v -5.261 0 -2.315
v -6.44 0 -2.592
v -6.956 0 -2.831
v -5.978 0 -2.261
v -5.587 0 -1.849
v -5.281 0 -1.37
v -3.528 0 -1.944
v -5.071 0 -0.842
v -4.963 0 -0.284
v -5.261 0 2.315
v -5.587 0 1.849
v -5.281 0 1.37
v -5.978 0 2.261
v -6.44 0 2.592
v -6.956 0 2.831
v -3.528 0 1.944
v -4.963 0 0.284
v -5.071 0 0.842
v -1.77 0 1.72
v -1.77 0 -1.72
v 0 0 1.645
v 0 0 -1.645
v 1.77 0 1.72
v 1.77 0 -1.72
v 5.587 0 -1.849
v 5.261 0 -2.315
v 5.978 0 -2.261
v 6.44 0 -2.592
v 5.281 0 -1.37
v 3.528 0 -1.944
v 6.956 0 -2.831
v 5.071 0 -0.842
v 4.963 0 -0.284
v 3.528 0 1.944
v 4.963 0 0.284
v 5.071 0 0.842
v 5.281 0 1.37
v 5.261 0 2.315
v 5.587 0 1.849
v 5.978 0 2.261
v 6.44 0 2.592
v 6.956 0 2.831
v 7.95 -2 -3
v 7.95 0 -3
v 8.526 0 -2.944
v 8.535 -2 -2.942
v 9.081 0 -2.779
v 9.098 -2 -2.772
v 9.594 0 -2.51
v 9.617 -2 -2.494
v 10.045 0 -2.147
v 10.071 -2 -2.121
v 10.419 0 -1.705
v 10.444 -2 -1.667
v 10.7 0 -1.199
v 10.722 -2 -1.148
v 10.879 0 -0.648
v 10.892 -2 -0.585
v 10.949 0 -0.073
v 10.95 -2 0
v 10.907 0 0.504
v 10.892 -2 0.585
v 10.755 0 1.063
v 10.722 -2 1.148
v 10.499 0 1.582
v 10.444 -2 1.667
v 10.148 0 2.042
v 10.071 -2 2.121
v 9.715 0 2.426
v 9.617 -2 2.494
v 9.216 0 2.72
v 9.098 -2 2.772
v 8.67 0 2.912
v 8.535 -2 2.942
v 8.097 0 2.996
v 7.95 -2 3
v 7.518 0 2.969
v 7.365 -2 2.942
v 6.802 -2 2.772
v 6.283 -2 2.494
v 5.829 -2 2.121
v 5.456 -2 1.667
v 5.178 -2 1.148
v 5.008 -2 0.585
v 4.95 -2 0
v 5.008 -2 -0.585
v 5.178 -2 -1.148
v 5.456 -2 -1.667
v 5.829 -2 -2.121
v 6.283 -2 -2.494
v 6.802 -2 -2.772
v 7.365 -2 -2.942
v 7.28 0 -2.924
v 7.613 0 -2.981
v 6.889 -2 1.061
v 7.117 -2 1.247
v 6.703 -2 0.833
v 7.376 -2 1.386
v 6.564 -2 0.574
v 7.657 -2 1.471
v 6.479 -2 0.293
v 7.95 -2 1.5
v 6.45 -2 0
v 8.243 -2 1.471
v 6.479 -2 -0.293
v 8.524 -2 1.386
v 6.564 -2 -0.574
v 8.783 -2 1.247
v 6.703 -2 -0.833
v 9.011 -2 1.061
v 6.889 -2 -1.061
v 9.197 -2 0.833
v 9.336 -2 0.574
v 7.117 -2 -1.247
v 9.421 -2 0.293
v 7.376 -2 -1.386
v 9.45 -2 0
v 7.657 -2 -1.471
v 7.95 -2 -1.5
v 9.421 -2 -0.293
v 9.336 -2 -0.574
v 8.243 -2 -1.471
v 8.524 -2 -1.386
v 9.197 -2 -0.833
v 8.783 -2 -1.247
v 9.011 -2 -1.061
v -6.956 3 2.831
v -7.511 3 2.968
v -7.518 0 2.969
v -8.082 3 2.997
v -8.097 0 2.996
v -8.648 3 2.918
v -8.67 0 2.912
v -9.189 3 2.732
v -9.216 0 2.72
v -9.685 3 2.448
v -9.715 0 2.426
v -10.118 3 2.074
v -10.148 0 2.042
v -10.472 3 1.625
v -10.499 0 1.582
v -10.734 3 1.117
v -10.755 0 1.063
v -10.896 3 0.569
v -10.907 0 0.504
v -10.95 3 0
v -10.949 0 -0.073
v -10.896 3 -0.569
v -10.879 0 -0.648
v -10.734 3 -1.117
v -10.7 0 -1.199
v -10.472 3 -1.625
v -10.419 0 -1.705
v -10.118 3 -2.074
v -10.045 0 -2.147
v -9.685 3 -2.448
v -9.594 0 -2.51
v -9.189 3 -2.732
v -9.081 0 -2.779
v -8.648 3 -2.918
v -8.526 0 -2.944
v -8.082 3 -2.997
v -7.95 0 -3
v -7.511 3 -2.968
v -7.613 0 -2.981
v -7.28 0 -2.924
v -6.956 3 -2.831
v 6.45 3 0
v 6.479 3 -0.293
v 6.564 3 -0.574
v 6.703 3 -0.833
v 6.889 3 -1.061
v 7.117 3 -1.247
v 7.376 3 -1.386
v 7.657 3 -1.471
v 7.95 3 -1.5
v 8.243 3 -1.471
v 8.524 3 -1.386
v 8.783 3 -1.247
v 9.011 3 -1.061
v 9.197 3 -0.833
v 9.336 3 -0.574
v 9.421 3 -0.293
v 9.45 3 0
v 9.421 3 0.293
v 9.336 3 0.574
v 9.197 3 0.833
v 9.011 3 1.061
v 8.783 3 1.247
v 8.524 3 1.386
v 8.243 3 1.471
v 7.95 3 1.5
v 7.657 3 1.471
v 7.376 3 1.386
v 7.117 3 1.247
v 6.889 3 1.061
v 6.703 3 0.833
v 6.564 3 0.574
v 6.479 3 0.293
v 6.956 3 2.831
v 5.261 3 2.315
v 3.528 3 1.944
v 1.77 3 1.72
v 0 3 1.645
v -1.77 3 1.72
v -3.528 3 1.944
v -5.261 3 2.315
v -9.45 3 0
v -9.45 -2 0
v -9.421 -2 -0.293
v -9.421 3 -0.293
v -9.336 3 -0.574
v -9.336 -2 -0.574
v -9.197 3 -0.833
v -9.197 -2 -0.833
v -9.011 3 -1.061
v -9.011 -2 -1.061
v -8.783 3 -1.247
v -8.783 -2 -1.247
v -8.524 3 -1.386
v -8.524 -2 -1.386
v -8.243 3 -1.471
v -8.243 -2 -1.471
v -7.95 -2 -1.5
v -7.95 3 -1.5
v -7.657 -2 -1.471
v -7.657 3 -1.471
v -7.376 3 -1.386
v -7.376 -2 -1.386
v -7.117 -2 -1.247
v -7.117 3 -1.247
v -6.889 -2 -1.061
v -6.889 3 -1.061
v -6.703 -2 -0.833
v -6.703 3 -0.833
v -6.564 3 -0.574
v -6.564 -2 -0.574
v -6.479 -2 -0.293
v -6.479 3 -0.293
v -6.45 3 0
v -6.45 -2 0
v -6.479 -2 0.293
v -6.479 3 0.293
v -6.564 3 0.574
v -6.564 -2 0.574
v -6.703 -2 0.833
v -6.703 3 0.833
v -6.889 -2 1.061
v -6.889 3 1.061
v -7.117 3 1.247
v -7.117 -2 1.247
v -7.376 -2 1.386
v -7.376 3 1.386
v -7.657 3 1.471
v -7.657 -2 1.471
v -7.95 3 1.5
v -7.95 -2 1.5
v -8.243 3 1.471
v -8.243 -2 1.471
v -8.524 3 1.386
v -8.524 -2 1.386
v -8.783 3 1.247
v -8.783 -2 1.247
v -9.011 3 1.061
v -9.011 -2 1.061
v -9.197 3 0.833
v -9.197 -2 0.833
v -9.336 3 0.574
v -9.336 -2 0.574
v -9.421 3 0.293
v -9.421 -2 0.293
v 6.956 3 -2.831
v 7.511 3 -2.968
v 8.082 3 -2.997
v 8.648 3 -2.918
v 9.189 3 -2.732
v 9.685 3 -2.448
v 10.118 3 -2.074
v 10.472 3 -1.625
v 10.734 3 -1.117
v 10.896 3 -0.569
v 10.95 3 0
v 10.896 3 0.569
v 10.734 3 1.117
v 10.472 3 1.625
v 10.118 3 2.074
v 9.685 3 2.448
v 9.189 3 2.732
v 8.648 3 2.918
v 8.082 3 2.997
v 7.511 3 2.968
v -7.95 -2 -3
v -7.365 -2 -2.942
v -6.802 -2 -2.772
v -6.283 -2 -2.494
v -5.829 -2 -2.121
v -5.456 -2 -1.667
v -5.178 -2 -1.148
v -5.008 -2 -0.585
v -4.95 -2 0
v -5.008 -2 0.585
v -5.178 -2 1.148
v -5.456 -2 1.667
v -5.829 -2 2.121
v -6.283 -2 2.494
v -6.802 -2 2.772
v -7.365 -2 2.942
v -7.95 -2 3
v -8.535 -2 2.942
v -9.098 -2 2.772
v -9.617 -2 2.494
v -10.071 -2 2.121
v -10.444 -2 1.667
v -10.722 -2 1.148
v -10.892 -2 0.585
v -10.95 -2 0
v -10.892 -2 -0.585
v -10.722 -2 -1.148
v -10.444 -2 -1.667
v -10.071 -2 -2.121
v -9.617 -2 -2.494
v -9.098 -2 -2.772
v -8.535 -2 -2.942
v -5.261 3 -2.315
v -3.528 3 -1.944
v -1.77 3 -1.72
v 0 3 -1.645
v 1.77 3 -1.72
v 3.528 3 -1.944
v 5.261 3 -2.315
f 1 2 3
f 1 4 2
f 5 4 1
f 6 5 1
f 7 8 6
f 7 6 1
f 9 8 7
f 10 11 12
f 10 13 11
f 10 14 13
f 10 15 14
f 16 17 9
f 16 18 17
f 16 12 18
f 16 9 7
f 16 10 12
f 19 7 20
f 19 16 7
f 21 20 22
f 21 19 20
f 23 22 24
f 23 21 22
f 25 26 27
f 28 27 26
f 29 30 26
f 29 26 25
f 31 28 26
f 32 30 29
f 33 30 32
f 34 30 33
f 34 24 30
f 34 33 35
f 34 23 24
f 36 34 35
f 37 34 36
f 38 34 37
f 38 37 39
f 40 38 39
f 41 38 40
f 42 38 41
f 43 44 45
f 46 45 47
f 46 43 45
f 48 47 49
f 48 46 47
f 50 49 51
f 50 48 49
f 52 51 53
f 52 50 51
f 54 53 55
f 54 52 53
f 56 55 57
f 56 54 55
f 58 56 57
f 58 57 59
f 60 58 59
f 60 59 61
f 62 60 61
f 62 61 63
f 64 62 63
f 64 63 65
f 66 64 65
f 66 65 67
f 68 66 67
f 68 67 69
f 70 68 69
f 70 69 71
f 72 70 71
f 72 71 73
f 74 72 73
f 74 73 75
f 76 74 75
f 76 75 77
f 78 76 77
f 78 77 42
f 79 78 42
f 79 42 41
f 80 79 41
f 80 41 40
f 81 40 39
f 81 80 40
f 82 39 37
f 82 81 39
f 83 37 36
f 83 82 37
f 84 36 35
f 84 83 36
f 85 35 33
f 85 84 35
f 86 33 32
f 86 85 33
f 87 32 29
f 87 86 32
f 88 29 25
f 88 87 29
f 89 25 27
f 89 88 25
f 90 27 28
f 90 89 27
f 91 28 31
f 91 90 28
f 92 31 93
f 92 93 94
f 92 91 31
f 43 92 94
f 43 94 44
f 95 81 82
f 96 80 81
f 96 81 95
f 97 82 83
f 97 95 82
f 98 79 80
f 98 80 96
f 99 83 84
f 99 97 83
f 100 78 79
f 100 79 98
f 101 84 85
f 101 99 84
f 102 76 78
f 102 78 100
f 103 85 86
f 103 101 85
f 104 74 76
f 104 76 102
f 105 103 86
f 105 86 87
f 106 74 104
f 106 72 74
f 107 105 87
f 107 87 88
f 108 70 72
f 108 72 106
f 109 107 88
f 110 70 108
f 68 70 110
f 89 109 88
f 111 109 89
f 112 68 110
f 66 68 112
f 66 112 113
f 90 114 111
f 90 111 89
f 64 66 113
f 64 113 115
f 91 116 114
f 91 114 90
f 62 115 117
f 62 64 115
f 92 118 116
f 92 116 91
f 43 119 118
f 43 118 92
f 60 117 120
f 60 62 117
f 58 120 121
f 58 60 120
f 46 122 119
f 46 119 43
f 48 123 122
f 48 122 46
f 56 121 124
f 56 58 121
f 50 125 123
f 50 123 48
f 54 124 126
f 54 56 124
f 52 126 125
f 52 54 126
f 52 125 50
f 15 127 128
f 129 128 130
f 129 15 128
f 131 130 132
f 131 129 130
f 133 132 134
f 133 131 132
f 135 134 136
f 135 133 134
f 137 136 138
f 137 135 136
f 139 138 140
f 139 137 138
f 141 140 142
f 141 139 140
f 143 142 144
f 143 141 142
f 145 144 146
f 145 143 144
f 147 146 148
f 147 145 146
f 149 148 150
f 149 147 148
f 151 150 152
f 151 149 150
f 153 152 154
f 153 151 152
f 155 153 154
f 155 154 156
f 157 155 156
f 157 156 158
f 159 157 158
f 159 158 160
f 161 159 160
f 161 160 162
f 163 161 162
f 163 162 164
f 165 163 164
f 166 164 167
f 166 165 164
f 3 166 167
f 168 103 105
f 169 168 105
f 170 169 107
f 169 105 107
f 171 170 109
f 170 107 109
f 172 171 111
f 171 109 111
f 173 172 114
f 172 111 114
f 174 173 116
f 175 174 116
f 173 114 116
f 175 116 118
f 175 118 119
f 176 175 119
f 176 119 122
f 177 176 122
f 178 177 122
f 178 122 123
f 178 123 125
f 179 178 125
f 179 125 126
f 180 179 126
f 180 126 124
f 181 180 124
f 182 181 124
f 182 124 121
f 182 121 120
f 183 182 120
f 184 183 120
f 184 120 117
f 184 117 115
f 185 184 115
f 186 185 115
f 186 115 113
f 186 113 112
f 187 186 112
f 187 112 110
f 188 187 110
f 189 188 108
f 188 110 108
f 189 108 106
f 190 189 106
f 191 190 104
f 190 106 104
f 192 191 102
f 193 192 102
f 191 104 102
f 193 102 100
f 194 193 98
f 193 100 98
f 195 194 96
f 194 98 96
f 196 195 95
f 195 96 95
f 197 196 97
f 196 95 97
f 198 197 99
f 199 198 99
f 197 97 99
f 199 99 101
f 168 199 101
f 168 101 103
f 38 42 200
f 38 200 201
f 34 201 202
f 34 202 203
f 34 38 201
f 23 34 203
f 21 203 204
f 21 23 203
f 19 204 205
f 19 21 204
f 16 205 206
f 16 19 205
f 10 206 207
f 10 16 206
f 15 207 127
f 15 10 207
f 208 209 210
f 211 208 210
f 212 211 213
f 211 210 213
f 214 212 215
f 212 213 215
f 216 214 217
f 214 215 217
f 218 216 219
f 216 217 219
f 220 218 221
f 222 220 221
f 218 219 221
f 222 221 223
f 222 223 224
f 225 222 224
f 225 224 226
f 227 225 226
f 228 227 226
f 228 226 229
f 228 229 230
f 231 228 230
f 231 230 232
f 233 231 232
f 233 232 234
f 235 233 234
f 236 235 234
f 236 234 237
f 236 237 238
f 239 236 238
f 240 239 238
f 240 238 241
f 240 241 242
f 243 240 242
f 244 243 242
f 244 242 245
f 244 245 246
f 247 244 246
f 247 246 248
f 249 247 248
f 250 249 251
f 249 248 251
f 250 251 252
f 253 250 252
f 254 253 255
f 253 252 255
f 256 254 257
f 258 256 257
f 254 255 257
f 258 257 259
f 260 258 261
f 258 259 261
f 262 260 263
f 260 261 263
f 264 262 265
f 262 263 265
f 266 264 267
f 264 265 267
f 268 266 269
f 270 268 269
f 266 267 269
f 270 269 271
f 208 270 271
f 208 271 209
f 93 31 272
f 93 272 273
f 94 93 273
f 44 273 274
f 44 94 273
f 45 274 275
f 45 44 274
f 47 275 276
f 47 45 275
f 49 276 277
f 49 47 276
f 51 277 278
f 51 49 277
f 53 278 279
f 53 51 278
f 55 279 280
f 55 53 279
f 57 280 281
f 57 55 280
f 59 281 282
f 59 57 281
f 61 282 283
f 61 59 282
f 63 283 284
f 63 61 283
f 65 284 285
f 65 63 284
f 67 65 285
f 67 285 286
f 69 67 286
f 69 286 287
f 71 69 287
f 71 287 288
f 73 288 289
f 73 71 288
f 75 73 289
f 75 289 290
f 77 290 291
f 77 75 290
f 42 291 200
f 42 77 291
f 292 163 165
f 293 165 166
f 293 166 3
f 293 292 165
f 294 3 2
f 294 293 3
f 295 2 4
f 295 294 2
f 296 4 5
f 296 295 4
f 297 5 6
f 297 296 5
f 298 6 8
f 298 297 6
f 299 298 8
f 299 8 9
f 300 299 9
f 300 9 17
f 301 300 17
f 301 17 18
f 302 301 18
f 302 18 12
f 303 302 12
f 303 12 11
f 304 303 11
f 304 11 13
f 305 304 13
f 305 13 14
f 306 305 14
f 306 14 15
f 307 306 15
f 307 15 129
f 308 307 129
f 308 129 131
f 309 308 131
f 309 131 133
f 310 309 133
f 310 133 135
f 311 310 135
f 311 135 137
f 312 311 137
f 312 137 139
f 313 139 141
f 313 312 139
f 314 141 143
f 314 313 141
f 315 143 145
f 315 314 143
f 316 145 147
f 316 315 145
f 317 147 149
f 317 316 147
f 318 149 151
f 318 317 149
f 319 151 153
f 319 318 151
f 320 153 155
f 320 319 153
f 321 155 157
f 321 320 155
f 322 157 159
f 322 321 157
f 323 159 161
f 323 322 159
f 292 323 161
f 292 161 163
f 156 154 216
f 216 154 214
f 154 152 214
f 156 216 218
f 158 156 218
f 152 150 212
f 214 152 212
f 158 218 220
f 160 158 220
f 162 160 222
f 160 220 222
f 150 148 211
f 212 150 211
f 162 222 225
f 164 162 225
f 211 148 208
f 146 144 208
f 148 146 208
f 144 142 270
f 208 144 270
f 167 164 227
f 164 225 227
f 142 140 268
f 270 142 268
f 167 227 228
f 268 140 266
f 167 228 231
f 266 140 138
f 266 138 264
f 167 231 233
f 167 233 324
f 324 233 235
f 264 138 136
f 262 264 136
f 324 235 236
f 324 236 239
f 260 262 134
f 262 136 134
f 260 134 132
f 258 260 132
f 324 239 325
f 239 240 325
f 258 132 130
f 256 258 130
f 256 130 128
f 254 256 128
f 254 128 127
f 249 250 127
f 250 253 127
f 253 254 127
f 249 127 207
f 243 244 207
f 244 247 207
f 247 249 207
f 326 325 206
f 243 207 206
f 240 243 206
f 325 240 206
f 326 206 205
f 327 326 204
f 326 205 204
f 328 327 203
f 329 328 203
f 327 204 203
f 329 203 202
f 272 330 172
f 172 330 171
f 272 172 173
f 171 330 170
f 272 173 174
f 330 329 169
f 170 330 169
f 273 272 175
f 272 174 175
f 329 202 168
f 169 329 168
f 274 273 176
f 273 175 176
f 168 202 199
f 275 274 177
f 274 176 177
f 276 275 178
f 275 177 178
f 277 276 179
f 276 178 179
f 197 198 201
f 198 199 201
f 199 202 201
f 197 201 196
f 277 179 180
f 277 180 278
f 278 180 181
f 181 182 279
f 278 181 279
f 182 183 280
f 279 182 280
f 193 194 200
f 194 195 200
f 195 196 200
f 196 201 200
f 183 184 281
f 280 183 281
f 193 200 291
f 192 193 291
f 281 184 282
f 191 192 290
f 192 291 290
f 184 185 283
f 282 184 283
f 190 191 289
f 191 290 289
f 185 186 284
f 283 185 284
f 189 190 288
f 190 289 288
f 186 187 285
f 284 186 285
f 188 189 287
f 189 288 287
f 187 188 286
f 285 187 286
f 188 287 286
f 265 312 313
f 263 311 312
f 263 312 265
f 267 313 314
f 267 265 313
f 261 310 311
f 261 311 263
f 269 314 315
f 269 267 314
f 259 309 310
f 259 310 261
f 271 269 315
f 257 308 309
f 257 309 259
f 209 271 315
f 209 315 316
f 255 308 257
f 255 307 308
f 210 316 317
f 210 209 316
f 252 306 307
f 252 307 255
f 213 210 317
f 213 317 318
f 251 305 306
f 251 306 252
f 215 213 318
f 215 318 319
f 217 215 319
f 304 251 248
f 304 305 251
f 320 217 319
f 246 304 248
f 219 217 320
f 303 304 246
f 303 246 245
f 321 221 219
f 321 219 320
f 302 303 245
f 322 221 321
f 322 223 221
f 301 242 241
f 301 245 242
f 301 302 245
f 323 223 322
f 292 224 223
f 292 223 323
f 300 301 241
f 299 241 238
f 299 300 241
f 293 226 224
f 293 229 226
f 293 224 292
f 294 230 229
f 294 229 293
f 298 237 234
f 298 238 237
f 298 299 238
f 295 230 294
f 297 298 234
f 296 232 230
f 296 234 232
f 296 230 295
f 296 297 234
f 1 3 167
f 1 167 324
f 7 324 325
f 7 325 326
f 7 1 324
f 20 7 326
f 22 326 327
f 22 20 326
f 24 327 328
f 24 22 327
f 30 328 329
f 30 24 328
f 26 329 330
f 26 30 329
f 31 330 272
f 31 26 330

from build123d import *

# Parameters (mm, degrees)
EXTRUDE_1_DEPTH          = 3
EXTRUDE_START            = 2
SKETCH_2_R               = 3
EXTRUDE_2_DEPTH          = 2
SKETCH_3_R               = 3
EXTRUDE_3_DEPTH          = 2
F_3_0_3_DIAMETER_HOLE1_D = 3


with BuildPart() as part:
    # 草图1 → 凸台-拉伸1 (new body)
    with BuildSketch(Plane.XZ):
        with BuildLine():
            ThreePointArc((-6.95625, -2.830629071), (0, -1.645032568), (6.95625, -2.830629071))
            ThreePointArc((6.95625, -2.830629071), (10.95, 0), (6.95625, 2.830629071))
            ThreePointArc((6.95625, 2.830629071), (0, 1.645032568), (-6.95625, 2.830629071))
            ThreePointArc((-6.95625, 2.830629071), (-10.95, 0), (-6.95625, -2.830629071))
        make_face()
    extrude(amount=-EXTRUDE_1_DEPTH)

    # 草图2 → 凸台-拉伸2 (add)
    with BuildSketch(Plane.XZ.offset(EXTRUDE_START)):
        with Locations(Location((7.95, 0, 0), (0, 0, 269.999999998))):
            Circle(SKETCH_2_R)
    extrude(amount=-EXTRUDE_2_DEPTH)

    # 草图3 → 凸台-拉伸3 (add)
    with BuildSketch(Plane.XZ.offset(EXTRUDE_START)):
        with Locations(Location((-7.95, 0, 0), (0, 0, 270))):
            Circle(SKETCH_3_R)
    extrude(amount=-EXTRUDE_3_DEPTH)

    # Ø3.0 (3) Diameter Hole1 (through all)
    with Locations(Plane(origin=(0, 3, 0), x_dir=(1, 0, 0), z_dir=(0, 1, 0))):
        with Locations((-7.95, 0), (7.95, 0)):
            Hole(F_3_0_3_DIAMETER_HOLE1_D / 2)


solid = part.part
